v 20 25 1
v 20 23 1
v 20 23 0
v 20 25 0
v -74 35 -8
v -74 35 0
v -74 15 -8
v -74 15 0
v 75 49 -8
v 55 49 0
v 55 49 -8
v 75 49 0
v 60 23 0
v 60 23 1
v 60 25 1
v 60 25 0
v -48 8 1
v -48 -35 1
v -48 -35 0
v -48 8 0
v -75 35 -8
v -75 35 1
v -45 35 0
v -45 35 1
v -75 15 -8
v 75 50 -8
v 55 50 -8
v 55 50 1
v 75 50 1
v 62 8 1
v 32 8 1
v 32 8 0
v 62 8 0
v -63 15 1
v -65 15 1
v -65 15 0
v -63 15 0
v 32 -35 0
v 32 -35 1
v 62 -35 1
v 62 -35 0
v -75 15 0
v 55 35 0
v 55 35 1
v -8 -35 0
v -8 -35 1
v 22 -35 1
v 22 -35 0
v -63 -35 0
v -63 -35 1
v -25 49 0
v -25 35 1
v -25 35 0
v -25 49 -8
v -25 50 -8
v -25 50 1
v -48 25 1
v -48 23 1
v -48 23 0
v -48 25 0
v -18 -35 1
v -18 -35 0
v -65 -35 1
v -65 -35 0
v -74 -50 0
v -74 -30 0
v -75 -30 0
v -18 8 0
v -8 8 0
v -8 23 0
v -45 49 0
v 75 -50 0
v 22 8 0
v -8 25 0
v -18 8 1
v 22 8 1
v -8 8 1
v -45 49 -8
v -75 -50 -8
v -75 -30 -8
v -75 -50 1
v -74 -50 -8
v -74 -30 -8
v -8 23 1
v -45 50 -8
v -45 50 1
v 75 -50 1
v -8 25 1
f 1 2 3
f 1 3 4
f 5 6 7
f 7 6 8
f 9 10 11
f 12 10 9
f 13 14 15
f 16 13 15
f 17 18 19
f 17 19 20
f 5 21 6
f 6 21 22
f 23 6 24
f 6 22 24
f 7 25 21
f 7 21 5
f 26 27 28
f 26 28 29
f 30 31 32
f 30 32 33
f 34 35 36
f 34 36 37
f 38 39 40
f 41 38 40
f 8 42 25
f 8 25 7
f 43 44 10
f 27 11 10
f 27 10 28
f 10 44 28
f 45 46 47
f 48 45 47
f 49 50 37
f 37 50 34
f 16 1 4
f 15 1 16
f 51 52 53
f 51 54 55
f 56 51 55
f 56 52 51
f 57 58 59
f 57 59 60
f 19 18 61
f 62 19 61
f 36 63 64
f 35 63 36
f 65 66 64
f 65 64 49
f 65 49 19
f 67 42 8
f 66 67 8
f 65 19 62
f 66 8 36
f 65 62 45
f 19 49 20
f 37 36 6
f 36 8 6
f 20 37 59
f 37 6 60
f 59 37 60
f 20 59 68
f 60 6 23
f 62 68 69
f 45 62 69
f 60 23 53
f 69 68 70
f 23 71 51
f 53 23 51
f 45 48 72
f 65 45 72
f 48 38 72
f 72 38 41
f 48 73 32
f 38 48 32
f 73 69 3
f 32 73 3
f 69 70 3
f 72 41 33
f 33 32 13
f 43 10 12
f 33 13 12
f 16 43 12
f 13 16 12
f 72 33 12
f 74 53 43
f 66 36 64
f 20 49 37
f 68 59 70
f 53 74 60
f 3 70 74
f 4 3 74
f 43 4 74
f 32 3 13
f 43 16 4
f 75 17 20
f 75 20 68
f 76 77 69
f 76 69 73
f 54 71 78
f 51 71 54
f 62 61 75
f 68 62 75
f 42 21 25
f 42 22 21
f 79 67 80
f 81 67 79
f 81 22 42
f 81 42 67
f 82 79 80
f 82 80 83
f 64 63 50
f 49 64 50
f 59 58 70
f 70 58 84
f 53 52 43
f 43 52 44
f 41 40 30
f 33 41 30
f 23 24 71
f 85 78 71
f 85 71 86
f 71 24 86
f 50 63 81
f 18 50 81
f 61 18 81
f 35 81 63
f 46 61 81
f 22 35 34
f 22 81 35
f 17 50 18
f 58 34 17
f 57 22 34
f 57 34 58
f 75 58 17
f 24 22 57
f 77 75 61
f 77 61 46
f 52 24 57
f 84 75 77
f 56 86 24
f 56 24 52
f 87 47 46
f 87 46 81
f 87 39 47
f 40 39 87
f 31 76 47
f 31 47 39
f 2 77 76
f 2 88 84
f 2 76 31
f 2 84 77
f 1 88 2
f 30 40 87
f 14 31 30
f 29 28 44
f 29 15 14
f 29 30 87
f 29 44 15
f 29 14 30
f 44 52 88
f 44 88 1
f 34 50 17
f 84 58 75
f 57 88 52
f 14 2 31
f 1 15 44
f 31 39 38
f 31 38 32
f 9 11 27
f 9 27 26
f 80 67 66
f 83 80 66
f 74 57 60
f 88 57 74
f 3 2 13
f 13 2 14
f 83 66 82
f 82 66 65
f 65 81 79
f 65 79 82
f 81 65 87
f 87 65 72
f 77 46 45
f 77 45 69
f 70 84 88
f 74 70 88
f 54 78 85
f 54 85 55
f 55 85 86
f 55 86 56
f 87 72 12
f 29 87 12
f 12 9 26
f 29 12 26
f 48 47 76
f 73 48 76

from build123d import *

# Parameters (mm, degrees)
F0_W     = 150
F0_H     = 100
F1_DEPTH = 1
F2_W     = 30
F2_H     = 15
F2_W_2   = 80
F3_DEPTH = 1.001
F4_W     = 1
F4_H     = 20
F4_W_2   = 20
F4_H_2   = 1
F5_DEPTH = 8
F6_W     = 2
F6_H     = 50
F6_W_2   = 40
F6_H_2   = 2
F6_W_3   = 30
F6_H_3   = 43
F7_DEPTH = 9.001


with BuildPart() as f1:
    # F0 (on Top) → F1 (new body)
    with BuildSketch(Plane.XY):
        Rectangle(F0_W, F0_H)
    extrude(amount=F1_DEPTH)

    # F2 (on face) → F3 (cut, through all)
    with BuildSketch(Plane.XY.offset(1)):
        with Locations((-60, 42.5)):
            Rectangle(F2_W, F2_H)
        with Locations((15, 42.5)):
            Rectangle(F2_W_2, F2_H)
    extrude(amount=-F3_DEPTH, mode=Mode.SUBTRACT)

    # F4 (on face) → F5 (join)
    with BuildSketch(Plane(origin=(0, 0, 0), x_dir=(1, 0, 0), z_dir=(0, 0, -1))):
        with Locations((-74.5, -25)):
            Rectangle(F4_W, F4_H)
        with Locations((-35, -49.5)):
            Rectangle(F4_W_2, F4_H_2)
        with Locations((65, -49.5)):
            Rectangle(F4_W_2, F4_H_2)
        with Locations((-74.5, 40)):
            Rectangle(F4_W, F4_H)
    extrude(amount=F5_DEPTH)

    # F6 (on face) → F7 (cut, through all)
    with BuildSketch(Plane.XY.offset(1)):
        with Locations((-64, -10)):
            Rectangle(F6_W, F6_H)
        with Locations((-28, 24)):
            Rectangle(F6_W_2, F6_H_2)
        with Locations((40, 24)):
            Rectangle(F6_W_2, F6_H_2)
        with Locations((-33, -13.5)):
            Rectangle(F6_W_3, F6_H_3)
        with Locations((7, -13.5)):
            Rectangle(F6_W_3, F6_H_3)
        with Locations((47, -13.5)):
            Rectangle(F6_W_3, F6_H_3)
    extrude(amount=-F7_DEPTH, mode=Mode.SUBTRACT)


solid = f1.part
